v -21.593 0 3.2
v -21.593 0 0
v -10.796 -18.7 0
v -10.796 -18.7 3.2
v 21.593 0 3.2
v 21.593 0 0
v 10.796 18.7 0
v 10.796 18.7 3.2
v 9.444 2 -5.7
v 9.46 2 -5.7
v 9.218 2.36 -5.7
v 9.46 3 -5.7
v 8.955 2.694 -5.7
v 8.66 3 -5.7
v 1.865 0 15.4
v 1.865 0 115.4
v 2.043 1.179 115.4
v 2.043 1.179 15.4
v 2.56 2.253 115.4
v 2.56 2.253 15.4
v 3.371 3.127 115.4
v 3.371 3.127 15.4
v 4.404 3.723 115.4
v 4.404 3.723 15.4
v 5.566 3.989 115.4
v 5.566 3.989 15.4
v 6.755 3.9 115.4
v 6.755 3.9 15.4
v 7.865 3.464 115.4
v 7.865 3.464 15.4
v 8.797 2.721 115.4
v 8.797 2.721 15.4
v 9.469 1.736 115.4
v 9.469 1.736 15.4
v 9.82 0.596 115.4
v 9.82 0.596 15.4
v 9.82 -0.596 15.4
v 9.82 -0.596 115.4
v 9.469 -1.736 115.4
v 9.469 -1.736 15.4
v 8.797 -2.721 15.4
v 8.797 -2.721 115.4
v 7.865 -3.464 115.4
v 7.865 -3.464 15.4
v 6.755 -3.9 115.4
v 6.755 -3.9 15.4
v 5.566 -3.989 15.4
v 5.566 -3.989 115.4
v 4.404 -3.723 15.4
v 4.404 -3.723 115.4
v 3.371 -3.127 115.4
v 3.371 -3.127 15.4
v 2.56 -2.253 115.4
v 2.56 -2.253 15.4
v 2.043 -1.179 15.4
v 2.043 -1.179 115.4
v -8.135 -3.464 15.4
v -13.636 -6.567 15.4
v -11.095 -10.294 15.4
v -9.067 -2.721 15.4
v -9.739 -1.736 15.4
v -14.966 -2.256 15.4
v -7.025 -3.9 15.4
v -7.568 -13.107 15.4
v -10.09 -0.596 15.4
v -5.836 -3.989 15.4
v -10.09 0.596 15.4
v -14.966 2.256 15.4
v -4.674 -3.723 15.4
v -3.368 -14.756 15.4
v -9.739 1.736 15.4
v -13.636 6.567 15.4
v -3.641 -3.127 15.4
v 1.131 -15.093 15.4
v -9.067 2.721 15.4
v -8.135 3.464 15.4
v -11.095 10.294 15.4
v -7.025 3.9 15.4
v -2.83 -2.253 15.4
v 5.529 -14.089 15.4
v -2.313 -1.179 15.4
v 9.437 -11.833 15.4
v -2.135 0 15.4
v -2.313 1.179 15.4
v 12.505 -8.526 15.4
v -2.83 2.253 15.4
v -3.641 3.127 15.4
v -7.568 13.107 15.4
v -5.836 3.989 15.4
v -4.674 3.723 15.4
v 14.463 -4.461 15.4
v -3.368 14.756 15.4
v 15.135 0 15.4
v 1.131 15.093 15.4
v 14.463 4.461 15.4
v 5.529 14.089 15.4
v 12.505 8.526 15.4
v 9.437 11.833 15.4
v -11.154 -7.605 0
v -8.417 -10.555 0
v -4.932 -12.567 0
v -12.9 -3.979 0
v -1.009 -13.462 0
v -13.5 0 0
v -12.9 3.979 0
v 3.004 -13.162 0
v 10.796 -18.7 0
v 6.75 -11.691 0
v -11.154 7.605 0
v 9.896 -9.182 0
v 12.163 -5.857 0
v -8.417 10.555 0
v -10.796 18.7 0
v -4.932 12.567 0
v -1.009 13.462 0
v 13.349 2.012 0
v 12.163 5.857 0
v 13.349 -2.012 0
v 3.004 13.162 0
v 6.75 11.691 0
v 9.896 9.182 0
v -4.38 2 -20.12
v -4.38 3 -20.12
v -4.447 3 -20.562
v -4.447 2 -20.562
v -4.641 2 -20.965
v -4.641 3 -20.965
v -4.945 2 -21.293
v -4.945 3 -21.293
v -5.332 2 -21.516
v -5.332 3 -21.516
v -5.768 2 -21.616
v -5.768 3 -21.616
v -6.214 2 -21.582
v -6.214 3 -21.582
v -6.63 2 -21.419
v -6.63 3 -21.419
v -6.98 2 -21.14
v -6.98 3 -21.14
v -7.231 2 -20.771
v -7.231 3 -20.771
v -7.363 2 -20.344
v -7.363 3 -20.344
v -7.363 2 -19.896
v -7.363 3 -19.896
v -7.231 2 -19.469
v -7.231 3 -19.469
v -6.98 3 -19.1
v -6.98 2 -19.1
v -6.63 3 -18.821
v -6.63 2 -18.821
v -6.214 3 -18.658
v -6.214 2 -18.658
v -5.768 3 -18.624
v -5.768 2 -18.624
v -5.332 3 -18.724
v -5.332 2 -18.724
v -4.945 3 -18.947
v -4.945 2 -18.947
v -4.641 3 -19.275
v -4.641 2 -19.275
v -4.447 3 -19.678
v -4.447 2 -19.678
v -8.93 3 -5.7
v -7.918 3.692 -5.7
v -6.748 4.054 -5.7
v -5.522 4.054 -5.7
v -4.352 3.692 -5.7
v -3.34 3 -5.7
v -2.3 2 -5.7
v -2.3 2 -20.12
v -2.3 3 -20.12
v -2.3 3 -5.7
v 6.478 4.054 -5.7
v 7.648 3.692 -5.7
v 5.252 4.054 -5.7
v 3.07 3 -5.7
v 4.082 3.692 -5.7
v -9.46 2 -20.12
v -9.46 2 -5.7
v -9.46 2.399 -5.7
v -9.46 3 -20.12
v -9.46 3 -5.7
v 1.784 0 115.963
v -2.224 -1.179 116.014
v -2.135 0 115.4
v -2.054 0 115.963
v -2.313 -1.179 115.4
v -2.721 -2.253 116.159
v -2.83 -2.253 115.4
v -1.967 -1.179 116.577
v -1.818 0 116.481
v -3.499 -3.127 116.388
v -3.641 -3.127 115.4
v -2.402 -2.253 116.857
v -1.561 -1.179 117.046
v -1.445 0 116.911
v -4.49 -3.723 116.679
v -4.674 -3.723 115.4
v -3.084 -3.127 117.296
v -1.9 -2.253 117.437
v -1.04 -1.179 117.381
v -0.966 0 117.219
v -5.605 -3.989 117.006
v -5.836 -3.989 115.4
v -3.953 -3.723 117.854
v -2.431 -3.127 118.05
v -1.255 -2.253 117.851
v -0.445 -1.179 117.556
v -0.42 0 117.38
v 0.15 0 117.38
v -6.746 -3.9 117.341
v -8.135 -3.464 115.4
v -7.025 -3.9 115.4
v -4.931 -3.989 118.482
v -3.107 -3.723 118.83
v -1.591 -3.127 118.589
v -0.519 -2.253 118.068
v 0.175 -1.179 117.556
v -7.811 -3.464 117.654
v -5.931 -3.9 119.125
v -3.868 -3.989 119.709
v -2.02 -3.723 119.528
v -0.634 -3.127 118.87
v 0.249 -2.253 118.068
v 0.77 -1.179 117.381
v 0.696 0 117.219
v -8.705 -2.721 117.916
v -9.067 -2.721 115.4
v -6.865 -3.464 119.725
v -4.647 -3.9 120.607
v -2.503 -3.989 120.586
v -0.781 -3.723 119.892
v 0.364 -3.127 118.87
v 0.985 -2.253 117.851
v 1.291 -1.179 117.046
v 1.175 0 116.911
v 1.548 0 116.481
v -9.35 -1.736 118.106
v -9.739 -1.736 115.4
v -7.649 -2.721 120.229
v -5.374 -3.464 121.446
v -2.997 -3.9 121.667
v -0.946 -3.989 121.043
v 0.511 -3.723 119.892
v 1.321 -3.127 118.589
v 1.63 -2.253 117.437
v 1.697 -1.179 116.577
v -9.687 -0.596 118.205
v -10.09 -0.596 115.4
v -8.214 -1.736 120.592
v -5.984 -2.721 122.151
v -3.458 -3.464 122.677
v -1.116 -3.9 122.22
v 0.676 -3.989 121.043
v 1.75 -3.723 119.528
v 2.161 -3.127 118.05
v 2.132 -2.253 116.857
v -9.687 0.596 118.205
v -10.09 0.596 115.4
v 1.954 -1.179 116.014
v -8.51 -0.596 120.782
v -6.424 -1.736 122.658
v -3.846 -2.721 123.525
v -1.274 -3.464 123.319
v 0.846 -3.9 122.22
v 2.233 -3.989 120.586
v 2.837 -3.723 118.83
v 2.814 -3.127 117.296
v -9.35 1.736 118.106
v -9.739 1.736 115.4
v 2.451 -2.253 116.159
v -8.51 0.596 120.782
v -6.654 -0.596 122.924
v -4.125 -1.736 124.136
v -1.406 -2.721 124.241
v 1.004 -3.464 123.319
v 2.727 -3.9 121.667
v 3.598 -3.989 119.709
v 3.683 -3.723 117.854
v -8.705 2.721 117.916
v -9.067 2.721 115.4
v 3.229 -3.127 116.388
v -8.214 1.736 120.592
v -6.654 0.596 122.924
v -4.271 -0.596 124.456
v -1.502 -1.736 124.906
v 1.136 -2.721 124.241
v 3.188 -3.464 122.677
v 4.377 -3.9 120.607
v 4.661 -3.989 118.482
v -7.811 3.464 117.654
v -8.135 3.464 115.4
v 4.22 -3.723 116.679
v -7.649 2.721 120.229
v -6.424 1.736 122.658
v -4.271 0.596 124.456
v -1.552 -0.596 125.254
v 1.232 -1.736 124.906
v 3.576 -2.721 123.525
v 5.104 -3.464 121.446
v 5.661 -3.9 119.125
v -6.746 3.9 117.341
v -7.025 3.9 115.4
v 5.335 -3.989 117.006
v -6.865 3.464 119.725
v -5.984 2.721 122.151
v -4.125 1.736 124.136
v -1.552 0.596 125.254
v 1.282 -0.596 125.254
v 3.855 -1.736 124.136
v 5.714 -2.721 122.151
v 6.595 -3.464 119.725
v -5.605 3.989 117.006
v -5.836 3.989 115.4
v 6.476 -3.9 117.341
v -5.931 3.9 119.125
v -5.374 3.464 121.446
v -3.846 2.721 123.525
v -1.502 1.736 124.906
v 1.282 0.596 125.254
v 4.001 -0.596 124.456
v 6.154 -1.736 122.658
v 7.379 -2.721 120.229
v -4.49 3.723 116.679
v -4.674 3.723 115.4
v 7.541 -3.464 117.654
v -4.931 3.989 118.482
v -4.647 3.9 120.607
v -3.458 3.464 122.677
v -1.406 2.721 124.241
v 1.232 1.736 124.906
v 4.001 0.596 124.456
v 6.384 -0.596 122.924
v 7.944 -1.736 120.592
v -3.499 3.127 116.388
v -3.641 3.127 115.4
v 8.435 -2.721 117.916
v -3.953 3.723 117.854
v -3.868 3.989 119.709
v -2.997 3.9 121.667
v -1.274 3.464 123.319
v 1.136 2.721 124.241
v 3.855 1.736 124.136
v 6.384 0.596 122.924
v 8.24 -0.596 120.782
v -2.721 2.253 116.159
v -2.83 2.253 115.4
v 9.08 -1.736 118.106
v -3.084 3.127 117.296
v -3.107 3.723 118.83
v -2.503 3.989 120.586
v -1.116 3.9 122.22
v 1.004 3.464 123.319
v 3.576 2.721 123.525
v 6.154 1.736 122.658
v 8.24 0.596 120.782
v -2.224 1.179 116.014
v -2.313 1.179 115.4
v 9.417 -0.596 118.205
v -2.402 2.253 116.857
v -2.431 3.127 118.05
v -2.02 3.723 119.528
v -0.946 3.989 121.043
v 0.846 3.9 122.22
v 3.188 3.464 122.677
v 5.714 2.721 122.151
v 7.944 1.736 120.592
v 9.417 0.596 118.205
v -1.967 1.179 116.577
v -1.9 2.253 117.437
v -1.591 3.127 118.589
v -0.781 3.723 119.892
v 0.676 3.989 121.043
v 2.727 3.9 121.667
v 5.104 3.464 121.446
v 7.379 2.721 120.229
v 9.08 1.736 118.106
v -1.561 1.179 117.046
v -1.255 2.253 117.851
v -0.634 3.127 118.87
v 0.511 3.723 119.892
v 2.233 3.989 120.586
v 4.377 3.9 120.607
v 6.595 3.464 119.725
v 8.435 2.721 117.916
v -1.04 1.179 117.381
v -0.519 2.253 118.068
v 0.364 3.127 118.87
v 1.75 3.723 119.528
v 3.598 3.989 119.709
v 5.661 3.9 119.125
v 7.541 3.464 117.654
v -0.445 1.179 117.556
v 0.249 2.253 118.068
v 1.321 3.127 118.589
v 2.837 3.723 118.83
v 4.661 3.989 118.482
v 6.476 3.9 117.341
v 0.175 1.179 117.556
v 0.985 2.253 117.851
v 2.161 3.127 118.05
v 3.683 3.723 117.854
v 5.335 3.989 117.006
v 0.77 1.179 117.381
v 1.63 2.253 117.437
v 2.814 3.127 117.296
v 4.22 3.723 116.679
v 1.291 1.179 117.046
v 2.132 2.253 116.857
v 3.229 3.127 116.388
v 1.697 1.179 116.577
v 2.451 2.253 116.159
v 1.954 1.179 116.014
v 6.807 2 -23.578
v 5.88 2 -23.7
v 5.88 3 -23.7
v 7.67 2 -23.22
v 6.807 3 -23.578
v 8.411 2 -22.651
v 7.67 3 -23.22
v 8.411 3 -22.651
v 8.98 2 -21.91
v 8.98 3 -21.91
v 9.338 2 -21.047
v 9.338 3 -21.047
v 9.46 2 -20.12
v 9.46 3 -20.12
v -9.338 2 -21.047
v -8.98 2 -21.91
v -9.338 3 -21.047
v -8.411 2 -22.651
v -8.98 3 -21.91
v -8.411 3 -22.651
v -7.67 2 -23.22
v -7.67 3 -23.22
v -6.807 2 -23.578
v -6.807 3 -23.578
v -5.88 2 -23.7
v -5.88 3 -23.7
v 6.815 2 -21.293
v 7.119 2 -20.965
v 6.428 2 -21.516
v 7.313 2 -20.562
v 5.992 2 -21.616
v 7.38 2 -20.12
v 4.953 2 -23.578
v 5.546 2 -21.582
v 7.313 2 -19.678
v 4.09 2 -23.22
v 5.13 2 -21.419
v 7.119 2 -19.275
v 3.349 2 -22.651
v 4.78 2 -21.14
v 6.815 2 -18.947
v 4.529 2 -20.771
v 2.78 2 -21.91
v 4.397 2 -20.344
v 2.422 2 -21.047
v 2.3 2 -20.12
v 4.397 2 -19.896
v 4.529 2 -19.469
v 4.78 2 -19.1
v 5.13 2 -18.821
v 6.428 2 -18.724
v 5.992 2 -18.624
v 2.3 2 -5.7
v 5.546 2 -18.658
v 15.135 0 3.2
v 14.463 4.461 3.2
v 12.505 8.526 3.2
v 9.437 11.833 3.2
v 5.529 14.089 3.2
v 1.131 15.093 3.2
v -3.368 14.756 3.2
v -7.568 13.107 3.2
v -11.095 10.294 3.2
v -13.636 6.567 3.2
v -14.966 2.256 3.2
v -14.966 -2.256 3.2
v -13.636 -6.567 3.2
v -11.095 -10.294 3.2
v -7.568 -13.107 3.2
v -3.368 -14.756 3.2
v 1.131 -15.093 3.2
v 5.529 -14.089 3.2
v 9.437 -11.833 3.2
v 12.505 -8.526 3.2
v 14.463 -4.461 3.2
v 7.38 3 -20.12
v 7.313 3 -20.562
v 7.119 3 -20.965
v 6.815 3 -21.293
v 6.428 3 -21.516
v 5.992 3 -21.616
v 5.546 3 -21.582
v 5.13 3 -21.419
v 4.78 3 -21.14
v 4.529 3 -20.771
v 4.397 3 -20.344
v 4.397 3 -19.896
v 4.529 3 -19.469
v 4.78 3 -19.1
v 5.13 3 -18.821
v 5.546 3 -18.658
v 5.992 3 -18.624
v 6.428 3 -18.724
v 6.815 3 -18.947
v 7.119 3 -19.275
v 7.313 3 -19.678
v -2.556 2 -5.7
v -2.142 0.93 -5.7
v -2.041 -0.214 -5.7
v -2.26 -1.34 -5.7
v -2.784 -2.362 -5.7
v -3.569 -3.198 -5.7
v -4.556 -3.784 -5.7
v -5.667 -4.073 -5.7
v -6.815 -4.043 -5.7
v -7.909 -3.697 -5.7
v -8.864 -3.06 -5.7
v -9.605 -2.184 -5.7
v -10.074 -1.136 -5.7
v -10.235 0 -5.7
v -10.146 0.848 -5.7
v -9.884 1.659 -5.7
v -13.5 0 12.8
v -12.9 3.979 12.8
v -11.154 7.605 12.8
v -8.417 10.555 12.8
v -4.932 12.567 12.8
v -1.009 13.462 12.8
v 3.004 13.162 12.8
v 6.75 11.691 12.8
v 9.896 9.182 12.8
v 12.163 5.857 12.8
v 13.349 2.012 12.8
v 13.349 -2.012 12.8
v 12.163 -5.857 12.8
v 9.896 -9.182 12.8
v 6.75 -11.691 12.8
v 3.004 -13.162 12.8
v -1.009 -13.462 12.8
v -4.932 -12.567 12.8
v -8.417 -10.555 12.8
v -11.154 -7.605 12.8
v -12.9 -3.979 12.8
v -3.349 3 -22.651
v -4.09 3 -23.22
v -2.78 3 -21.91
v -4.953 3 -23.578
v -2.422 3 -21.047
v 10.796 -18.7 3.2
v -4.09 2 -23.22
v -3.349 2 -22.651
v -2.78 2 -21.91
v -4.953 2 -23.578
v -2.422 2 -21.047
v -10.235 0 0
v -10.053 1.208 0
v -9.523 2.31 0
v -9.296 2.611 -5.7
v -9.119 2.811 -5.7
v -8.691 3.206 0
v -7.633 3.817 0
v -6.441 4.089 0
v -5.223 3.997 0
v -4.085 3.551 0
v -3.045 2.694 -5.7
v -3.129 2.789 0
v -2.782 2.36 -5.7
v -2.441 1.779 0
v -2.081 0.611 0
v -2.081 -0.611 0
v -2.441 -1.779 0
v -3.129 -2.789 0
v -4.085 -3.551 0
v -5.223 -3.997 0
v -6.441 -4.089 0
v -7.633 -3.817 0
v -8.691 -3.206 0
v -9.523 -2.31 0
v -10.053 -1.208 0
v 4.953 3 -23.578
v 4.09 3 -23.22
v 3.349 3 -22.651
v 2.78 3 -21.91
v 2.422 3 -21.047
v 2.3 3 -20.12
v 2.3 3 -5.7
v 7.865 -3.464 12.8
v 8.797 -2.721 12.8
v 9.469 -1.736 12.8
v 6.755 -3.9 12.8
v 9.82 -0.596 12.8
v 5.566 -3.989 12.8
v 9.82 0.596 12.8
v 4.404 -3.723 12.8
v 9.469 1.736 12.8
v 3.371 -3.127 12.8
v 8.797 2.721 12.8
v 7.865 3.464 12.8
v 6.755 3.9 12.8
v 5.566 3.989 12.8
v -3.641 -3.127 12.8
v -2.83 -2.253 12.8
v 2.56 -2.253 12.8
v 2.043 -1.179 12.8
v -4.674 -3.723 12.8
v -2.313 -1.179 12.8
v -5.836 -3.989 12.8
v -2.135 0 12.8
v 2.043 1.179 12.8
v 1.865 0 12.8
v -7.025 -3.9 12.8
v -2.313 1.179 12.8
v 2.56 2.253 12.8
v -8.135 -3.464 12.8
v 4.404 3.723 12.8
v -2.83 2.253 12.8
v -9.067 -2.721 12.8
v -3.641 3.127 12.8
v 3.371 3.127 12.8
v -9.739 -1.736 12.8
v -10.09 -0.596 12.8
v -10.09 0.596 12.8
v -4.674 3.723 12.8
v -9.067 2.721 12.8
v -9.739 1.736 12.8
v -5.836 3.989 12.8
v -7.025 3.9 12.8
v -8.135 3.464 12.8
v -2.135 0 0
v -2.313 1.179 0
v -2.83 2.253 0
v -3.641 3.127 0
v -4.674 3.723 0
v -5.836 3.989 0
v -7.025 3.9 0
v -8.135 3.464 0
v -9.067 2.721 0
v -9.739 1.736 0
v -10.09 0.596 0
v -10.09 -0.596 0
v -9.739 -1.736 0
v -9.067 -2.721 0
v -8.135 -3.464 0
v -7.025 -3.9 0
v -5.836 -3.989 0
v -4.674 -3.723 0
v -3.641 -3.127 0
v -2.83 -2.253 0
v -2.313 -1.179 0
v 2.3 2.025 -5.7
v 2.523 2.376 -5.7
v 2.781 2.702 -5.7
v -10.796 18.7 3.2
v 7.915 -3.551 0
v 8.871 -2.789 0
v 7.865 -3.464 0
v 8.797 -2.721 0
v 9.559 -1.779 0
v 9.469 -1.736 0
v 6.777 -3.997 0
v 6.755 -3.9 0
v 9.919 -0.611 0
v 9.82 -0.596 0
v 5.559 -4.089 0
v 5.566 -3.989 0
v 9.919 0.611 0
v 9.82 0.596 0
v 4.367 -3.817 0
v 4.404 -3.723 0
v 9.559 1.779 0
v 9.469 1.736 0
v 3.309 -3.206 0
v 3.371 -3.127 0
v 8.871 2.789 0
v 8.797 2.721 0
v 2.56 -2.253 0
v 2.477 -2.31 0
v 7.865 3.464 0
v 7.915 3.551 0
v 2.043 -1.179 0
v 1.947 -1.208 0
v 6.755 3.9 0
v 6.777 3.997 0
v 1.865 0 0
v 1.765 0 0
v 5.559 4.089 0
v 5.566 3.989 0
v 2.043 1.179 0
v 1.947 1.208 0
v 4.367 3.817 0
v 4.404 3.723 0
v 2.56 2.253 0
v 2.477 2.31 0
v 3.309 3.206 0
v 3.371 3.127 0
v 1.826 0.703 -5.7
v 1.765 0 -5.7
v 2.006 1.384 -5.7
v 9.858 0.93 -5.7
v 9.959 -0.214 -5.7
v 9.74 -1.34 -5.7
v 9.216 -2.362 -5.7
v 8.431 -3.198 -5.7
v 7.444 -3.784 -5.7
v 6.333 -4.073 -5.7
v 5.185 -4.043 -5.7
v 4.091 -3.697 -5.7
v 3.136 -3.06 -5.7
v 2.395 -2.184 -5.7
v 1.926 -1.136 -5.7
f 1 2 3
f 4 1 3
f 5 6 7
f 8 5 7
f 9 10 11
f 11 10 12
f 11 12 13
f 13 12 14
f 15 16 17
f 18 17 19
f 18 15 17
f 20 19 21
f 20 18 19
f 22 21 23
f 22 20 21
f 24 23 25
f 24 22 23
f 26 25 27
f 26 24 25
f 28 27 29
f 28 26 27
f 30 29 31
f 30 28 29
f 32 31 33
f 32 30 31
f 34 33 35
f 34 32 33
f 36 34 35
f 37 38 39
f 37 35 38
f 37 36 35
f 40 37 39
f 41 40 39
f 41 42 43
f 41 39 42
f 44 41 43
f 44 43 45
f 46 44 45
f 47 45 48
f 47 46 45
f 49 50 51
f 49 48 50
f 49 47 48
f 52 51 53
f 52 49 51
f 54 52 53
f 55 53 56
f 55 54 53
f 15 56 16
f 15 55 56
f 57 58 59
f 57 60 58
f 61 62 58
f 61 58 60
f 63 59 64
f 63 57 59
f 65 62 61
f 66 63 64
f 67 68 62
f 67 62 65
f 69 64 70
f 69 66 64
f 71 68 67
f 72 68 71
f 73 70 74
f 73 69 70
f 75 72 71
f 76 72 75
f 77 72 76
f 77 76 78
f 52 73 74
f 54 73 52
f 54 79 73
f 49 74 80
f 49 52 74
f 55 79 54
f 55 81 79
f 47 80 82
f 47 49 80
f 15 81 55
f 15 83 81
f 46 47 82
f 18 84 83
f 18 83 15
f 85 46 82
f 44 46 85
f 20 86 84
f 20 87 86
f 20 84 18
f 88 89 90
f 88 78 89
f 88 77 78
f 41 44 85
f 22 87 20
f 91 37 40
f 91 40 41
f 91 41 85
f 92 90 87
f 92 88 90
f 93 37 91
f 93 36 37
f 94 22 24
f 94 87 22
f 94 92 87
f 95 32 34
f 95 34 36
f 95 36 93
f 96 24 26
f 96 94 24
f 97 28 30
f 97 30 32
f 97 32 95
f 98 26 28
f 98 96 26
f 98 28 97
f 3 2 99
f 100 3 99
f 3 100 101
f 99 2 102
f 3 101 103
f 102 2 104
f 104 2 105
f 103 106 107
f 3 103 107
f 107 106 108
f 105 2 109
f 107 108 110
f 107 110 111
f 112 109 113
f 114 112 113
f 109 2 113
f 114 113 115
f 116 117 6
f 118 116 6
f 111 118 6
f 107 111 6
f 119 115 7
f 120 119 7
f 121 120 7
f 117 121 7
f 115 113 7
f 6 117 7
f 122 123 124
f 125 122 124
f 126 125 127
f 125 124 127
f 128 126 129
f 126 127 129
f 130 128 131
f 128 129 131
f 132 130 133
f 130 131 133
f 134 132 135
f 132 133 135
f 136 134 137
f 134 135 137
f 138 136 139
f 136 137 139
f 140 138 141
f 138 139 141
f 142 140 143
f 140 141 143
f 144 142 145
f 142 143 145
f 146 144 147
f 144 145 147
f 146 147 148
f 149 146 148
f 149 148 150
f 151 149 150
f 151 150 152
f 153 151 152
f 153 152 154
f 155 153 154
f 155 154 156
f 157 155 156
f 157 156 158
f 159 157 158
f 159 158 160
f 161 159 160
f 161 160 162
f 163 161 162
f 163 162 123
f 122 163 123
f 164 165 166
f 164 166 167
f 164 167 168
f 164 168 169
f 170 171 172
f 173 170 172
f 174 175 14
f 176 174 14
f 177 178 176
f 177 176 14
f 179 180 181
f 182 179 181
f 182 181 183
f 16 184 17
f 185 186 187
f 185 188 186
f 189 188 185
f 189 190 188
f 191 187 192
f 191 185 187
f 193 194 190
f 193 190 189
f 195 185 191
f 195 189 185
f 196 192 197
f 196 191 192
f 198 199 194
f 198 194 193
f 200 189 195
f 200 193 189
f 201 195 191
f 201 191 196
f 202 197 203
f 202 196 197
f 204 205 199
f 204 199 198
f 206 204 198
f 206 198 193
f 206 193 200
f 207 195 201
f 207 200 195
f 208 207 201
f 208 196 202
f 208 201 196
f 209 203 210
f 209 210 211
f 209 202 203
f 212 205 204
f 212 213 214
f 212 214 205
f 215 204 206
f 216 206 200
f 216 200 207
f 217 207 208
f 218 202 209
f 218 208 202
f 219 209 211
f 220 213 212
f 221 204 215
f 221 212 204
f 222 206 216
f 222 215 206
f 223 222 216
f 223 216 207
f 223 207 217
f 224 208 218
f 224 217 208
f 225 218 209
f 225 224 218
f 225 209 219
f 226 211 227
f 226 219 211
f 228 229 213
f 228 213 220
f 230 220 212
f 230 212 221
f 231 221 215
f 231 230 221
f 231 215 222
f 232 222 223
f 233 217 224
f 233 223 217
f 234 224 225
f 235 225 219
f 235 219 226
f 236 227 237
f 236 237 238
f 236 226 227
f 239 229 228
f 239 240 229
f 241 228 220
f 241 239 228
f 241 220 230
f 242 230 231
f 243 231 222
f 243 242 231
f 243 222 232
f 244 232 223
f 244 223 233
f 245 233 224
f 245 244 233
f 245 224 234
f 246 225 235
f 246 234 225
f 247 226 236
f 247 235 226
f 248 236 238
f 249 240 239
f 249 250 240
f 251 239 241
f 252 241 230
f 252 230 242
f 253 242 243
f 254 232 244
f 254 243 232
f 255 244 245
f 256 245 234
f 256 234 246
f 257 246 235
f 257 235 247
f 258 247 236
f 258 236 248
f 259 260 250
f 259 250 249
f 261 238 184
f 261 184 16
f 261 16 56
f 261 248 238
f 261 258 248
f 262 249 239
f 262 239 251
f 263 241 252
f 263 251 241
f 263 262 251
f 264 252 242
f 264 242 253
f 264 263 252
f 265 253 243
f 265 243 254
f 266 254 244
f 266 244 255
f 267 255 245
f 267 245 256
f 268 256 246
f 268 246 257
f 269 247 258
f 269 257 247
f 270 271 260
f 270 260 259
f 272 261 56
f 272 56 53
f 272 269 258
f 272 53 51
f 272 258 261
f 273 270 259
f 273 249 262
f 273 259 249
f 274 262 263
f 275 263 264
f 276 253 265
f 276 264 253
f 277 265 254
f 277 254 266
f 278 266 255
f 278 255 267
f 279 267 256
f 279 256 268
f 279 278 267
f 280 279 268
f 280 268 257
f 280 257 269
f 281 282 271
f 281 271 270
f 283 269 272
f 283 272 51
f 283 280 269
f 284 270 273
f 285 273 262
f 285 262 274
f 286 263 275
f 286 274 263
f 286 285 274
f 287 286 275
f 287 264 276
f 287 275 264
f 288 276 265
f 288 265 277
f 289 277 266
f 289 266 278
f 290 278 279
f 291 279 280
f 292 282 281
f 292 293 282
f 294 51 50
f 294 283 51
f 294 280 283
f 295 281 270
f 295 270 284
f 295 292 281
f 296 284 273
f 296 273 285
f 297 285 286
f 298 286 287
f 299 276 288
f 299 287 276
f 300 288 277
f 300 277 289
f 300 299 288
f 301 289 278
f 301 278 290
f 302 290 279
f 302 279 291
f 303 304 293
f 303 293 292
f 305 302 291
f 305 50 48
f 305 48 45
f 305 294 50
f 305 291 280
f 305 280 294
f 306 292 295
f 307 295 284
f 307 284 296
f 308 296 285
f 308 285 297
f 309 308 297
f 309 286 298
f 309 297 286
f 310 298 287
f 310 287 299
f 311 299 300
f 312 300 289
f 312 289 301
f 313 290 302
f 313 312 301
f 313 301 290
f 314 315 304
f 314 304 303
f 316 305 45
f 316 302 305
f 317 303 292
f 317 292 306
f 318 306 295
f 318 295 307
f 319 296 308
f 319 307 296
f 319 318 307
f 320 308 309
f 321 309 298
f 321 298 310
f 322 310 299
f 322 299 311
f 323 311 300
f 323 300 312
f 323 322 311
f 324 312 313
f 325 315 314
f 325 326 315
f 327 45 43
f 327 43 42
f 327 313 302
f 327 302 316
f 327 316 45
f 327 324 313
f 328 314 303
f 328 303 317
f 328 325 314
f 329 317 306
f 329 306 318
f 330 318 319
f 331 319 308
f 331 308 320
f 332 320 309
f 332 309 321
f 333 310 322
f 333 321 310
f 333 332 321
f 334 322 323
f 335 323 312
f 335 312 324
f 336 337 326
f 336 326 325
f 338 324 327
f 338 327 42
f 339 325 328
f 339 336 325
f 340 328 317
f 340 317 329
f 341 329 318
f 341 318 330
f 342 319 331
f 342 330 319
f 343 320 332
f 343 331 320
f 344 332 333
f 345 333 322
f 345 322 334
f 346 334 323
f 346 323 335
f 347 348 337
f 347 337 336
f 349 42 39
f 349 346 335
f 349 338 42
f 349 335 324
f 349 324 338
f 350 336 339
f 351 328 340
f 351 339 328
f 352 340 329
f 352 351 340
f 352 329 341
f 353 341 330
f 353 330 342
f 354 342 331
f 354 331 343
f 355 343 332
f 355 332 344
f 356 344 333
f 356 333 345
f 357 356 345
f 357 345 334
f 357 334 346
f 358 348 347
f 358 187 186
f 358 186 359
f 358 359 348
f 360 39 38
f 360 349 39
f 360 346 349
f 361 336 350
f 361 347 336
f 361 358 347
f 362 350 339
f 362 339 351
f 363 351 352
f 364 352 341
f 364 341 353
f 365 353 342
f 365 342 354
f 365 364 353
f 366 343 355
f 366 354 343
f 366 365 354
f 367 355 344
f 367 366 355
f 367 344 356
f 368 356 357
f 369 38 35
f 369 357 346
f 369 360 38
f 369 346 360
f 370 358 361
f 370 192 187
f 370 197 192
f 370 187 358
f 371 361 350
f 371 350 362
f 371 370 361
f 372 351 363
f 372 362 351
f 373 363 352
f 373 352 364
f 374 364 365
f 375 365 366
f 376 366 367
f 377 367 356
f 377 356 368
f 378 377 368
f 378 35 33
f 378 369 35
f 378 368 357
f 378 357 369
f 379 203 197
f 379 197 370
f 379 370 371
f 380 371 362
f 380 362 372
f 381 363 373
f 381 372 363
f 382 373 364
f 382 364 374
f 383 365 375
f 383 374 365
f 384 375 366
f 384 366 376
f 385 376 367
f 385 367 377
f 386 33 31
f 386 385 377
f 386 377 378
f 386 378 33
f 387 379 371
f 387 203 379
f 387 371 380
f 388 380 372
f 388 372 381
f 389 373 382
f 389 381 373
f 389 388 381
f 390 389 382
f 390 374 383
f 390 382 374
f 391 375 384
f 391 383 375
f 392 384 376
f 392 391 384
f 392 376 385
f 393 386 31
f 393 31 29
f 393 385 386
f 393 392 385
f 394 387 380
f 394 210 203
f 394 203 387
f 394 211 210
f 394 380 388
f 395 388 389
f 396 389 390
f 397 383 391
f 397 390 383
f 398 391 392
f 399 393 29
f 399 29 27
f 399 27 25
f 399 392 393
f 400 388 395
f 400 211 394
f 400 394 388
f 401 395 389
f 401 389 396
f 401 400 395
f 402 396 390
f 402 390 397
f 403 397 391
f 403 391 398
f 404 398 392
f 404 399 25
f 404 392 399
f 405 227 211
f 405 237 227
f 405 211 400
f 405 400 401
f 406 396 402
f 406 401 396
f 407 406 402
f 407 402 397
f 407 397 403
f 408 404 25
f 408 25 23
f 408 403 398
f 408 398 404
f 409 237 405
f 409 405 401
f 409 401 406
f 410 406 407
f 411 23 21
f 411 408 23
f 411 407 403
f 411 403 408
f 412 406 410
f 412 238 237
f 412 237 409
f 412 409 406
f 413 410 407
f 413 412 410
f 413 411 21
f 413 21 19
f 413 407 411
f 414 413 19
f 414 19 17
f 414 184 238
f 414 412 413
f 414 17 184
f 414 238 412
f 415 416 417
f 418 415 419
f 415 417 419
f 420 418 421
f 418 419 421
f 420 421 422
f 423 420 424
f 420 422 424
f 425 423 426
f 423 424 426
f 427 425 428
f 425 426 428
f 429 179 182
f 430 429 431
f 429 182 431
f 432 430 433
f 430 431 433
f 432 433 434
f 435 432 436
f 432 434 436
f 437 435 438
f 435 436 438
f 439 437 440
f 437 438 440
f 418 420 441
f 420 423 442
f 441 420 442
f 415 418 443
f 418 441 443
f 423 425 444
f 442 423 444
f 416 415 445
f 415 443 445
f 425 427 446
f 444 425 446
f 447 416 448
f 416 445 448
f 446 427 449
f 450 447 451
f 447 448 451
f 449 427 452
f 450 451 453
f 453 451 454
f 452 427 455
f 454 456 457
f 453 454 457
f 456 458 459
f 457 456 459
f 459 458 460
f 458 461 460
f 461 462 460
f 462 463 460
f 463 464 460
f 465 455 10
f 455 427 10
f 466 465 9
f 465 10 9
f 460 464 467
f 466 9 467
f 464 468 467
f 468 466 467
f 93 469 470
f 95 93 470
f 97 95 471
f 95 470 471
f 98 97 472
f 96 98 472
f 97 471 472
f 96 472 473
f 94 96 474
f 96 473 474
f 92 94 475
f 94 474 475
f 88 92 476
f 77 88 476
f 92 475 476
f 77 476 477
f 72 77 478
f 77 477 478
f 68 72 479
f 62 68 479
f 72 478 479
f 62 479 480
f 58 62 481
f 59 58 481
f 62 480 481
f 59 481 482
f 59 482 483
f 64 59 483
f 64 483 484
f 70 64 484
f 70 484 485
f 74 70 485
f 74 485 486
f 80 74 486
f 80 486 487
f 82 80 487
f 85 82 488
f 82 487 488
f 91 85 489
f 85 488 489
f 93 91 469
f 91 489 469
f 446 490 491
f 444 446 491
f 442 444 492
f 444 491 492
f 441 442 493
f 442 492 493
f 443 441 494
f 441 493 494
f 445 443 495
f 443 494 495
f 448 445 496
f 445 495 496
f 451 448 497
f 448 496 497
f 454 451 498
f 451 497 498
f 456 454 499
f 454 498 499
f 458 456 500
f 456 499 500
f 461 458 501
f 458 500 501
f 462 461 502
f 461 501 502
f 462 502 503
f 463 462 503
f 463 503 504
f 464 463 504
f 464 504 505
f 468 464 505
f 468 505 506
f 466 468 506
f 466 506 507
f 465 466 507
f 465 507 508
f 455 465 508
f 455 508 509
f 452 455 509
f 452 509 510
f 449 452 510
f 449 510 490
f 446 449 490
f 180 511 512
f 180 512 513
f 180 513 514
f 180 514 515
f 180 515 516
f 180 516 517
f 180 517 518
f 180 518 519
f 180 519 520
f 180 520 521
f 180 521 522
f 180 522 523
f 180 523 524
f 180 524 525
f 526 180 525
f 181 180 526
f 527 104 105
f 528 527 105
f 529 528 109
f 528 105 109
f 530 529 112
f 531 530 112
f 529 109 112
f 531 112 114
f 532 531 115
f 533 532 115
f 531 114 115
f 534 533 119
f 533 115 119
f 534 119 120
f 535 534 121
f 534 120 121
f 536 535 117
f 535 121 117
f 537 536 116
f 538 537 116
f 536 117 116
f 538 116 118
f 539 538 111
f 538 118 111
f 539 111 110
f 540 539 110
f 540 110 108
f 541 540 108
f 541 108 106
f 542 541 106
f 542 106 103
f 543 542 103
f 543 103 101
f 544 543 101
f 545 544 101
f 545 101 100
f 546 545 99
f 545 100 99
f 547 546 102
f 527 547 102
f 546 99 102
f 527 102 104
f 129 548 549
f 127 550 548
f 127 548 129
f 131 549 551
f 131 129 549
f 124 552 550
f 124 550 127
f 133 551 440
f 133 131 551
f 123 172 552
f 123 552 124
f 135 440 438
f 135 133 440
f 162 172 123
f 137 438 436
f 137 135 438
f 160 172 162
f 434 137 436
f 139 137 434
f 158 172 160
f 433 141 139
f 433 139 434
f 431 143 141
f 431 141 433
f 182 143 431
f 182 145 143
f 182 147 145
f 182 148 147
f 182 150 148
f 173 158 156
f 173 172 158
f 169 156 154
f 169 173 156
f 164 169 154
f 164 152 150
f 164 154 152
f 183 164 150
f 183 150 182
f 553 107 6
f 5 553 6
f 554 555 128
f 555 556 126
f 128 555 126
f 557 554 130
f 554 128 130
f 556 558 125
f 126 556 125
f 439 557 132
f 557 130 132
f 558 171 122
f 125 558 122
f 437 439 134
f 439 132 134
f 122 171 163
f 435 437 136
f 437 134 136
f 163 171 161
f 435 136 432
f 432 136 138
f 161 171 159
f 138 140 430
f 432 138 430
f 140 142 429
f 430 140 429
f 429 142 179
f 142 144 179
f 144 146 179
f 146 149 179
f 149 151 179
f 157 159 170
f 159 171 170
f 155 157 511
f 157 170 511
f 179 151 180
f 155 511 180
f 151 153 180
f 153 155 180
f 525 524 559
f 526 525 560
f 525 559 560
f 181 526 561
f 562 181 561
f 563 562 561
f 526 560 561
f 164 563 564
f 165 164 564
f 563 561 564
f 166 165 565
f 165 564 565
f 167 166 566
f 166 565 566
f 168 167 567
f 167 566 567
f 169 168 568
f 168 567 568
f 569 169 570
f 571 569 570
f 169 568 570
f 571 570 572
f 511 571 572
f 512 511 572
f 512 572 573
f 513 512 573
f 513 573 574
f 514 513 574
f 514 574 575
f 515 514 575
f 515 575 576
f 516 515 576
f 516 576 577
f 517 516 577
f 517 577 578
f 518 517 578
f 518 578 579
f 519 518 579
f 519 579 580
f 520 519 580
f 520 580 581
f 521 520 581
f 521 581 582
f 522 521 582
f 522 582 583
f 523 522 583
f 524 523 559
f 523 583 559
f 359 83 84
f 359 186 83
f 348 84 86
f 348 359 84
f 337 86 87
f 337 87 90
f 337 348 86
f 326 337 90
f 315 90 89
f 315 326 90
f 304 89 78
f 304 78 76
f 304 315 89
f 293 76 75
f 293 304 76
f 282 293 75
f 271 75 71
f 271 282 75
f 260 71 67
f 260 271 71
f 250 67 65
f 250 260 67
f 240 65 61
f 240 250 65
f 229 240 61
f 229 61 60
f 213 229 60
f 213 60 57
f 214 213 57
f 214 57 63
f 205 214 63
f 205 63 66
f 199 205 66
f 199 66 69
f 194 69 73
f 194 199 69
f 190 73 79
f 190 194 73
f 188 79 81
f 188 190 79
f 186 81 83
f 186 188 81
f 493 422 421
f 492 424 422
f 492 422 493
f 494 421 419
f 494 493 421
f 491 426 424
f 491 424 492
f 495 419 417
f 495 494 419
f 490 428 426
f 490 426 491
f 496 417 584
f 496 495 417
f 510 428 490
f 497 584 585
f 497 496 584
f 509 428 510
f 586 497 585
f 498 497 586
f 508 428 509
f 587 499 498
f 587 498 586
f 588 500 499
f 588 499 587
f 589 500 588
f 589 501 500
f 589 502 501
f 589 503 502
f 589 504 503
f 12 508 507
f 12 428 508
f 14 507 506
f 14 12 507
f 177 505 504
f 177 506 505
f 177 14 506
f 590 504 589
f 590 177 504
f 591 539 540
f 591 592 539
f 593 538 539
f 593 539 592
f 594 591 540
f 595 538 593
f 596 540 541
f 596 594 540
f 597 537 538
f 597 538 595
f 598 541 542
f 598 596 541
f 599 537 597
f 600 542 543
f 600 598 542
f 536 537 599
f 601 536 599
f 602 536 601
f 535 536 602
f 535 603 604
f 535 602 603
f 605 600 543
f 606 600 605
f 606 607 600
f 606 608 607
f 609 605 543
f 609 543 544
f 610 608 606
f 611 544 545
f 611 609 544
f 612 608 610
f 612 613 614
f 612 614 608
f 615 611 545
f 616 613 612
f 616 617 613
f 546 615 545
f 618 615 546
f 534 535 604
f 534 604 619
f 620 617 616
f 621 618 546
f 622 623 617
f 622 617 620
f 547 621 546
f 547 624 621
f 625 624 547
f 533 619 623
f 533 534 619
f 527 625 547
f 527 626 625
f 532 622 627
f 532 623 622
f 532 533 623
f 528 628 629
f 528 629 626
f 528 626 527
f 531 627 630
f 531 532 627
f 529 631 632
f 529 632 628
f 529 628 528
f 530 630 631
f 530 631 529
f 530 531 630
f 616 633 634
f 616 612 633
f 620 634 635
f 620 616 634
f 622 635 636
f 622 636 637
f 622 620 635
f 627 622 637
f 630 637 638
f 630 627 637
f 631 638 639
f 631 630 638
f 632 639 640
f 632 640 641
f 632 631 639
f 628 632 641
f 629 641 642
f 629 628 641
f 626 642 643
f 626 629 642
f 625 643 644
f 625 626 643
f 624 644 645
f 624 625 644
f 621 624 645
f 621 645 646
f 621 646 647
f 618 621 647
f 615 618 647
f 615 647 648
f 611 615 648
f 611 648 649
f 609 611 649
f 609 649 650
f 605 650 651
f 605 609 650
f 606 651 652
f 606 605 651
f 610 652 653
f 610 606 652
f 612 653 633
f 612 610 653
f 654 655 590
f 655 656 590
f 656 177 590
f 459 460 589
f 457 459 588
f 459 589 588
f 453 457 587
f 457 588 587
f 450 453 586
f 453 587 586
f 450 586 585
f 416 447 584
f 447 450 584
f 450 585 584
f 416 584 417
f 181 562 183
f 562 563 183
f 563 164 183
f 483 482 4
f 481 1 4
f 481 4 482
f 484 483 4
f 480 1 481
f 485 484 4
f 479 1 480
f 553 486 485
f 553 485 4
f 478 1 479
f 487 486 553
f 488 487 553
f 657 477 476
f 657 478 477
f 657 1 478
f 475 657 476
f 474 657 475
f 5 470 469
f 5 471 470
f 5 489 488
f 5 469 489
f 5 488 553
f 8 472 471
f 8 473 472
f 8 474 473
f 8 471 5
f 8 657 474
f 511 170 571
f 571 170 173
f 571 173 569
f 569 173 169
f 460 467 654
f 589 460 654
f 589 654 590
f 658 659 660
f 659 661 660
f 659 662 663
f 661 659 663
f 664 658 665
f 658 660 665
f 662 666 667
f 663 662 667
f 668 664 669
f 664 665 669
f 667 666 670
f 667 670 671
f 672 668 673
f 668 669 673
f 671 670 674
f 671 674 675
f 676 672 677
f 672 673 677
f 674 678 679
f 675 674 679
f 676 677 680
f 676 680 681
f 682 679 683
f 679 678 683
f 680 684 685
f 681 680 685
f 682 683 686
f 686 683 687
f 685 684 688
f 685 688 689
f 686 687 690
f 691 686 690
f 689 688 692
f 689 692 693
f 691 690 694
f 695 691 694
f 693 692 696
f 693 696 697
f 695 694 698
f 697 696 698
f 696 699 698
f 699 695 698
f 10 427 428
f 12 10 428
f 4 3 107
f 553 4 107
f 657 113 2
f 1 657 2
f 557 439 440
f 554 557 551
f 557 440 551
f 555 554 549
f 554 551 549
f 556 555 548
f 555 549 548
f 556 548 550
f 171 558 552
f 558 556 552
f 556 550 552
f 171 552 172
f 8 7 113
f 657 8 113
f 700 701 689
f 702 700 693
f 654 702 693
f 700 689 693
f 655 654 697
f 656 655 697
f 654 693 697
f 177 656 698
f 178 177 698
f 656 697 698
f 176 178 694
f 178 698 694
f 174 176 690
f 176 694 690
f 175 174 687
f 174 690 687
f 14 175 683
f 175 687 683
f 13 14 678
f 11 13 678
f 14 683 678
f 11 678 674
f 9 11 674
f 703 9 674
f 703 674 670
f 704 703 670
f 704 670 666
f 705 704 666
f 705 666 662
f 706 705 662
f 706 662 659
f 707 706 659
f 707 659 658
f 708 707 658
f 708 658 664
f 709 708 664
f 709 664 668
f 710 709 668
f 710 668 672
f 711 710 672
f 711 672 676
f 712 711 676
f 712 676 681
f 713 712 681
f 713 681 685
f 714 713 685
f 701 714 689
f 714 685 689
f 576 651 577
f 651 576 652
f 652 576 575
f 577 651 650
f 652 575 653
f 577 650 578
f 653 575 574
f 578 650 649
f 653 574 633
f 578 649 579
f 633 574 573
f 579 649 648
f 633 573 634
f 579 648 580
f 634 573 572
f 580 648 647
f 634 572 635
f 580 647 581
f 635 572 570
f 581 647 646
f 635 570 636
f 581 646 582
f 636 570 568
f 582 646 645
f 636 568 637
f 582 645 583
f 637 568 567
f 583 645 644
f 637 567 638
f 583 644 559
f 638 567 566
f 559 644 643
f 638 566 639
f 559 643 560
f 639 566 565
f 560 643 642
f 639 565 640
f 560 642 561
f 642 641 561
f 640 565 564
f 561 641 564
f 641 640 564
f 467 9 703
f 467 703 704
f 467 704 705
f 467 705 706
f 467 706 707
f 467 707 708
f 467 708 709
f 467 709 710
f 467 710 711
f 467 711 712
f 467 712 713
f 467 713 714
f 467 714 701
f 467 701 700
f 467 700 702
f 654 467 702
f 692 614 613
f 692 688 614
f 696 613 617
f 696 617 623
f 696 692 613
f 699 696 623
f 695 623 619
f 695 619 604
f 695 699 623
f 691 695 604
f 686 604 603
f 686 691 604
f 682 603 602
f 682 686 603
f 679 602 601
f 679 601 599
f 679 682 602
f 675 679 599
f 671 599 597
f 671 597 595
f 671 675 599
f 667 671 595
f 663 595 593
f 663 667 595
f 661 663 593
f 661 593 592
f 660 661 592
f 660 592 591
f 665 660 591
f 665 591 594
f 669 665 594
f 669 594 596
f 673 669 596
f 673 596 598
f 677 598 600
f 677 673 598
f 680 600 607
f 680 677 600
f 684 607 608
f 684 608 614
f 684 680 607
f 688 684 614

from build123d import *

# Parameters (mm, degrees)
BOSS_EXTRUDE1_DEPTH = 3.2
SKETCH2_R           = 15.135
BOSS_EXTRUDE2_DEPTH = 12.2
SKETCH3_R           = 13.5
CUT_EXTRUDE1_DEPTH  = 12.8
SWEEP1_PROFILE_R    = 4
SKETCH29_R          = 4.1
BOSS_EXTRUDE4_DEPTH = 5.7
SKETCH33_W          = 7.16
SKETCH33_H          = 1
BOSS_EXTRUDE5_DEPTH = 18
SKETCH34_R          = 1.5
CUT_EXTRUDE2_DEPTH  = 22.7


with BuildPart() as part:
    # Sketch1 → Boss-Extrude1 (new body)
    with BuildSketch(Plane.XY):
        Polygon((10.796450034, -18.7), (21.592900068, 0), (10.796450034, 18.7), (-10.796450034, 18.7), (-21.592900068, 0), (-10.796450034, -18.7), align=None)
    extrude(amount=BOSS_EXTRUDE1_DEPTH)

    # Sketch2 → Boss-Extrude2 (add)
    with BuildSketch(Plane.XY.offset(3.2)):
        Circle(SKETCH2_R)
    extrude(amount=BOSS_EXTRUDE2_DEPTH)

    # Sketch3 → Cut-Extrude1 (cut)
    with BuildSketch(Plane(origin=(0, 0, 0), x_dir=(-1, 0, 0), z_dir=(0, 0, -1))):
        Circle(SKETCH3_R)
    extrude(amount=-CUT_EXTRUDE1_DEPTH, mode=Mode.SUBTRACT)

    # Sweep1: sweep along a path in Sketch4
    with BuildLine(Plane(origin=(0, 0, 0), x_dir=(1, 0, 0), z_dir=(0, 1, 0))) as sweep1_path:
        Line((-6.135, 0), (-6.135, -115.4))
        ThreePointArc((-6.135, -115.4), (-0.135, -121.4), (5.865, -115.4))
        Line((5.865, -115.4), (5.865, 0))
    # Sweep1 profile (on start of the path) → Sweep1 (sweep)
    with BuildSketch(Plane(origin=(-6.135, 0, 0), x_dir=(1, 0, 0), z_dir=(0, 0, 1))):
        Circle(SWEEP1_PROFILE_R)
    sweep(path=sweep1_path.line)

    # Sketch29 → Boss-Extrude4 (add)
    with BuildSketch(Plane(origin=(0, 0, 0), x_dir=(-1, 0, 0), z_dir=(0, 0, -1))):
        with Locations((-5.865, 0)):
            Circle(SKETCH29_R)
        with Locations((6.135, 0)):
            Circle(SKETCH29_R)
    extrude(amount=BOSS_EXTRUDE4_DEPTH)

    # Sketch33 → Boss-Extrude5 (add)
    with BuildSketch(Plane(origin=(0, 0, -5.7), x_dir=(-1, 0, 0), z_dir=(0, 0, -1))):
        with Locations((-5.88, 2.5)):
            Rectangle(SKETCH33_W, SKETCH33_H)
        with Locations((5.88, 2.5)):
            Rectangle(SKETCH33_W, SKETCH33_H)
    extrude(amount=BOSS_EXTRUDE5_DEPTH)

    # Sketch34 → Cut-Extrude2 (cut, through all)
    with BuildSketch(Plane(origin=(0, 3, 0), x_dir=(1, 0, 0), z_dir=(0, 1, 0))):
        with BuildLine():
            ThreePointArc((-9.46, 20.12), (-8.411442277, 22.651442277), (-5.88, 23.7))
            Line((-5.88, 23.7), (-9.46, 23.7))
            Line((-9.46, 23.7), (-9.46, 20.12))
        make_face()
        with BuildLine():
            ThreePointArc((-5.88, 23.7), (-3.348557723, 22.651442277), (-2.3, 20.12))
            Line((-2.3, 20.12), (-2.3, 23.7))
            Line((-2.3, 23.7), (-5.88, 23.7))
        make_face()
        with BuildLine():
            ThreePointArc((2.3, 20.12), (3.348557723, 22.651442277), (5.88, 23.7))
            Line((5.88, 23.7), (2.3, 23.7))
            Line((2.3, 23.7), (2.3, 20.12))
        make_face()
        with BuildLine():
            ThreePointArc((5.88, 23.7), (8.411442277, 22.651442277), (9.46, 20.12))
            Line((9.46, 20.12), (9.46, 23.7))
            Line((9.46, 23.7), (5.88, 23.7))
        make_face()
        with Locations((-5.88, 20.12)):
            Circle(SKETCH34_R)
        with Locations((5.88, 20.12)):
            Circle(SKETCH34_R)
    extrude(amount=-CUT_EXTRUDE2_DEPTH, mode=Mode.SUBTRACT)


solid = part.part
